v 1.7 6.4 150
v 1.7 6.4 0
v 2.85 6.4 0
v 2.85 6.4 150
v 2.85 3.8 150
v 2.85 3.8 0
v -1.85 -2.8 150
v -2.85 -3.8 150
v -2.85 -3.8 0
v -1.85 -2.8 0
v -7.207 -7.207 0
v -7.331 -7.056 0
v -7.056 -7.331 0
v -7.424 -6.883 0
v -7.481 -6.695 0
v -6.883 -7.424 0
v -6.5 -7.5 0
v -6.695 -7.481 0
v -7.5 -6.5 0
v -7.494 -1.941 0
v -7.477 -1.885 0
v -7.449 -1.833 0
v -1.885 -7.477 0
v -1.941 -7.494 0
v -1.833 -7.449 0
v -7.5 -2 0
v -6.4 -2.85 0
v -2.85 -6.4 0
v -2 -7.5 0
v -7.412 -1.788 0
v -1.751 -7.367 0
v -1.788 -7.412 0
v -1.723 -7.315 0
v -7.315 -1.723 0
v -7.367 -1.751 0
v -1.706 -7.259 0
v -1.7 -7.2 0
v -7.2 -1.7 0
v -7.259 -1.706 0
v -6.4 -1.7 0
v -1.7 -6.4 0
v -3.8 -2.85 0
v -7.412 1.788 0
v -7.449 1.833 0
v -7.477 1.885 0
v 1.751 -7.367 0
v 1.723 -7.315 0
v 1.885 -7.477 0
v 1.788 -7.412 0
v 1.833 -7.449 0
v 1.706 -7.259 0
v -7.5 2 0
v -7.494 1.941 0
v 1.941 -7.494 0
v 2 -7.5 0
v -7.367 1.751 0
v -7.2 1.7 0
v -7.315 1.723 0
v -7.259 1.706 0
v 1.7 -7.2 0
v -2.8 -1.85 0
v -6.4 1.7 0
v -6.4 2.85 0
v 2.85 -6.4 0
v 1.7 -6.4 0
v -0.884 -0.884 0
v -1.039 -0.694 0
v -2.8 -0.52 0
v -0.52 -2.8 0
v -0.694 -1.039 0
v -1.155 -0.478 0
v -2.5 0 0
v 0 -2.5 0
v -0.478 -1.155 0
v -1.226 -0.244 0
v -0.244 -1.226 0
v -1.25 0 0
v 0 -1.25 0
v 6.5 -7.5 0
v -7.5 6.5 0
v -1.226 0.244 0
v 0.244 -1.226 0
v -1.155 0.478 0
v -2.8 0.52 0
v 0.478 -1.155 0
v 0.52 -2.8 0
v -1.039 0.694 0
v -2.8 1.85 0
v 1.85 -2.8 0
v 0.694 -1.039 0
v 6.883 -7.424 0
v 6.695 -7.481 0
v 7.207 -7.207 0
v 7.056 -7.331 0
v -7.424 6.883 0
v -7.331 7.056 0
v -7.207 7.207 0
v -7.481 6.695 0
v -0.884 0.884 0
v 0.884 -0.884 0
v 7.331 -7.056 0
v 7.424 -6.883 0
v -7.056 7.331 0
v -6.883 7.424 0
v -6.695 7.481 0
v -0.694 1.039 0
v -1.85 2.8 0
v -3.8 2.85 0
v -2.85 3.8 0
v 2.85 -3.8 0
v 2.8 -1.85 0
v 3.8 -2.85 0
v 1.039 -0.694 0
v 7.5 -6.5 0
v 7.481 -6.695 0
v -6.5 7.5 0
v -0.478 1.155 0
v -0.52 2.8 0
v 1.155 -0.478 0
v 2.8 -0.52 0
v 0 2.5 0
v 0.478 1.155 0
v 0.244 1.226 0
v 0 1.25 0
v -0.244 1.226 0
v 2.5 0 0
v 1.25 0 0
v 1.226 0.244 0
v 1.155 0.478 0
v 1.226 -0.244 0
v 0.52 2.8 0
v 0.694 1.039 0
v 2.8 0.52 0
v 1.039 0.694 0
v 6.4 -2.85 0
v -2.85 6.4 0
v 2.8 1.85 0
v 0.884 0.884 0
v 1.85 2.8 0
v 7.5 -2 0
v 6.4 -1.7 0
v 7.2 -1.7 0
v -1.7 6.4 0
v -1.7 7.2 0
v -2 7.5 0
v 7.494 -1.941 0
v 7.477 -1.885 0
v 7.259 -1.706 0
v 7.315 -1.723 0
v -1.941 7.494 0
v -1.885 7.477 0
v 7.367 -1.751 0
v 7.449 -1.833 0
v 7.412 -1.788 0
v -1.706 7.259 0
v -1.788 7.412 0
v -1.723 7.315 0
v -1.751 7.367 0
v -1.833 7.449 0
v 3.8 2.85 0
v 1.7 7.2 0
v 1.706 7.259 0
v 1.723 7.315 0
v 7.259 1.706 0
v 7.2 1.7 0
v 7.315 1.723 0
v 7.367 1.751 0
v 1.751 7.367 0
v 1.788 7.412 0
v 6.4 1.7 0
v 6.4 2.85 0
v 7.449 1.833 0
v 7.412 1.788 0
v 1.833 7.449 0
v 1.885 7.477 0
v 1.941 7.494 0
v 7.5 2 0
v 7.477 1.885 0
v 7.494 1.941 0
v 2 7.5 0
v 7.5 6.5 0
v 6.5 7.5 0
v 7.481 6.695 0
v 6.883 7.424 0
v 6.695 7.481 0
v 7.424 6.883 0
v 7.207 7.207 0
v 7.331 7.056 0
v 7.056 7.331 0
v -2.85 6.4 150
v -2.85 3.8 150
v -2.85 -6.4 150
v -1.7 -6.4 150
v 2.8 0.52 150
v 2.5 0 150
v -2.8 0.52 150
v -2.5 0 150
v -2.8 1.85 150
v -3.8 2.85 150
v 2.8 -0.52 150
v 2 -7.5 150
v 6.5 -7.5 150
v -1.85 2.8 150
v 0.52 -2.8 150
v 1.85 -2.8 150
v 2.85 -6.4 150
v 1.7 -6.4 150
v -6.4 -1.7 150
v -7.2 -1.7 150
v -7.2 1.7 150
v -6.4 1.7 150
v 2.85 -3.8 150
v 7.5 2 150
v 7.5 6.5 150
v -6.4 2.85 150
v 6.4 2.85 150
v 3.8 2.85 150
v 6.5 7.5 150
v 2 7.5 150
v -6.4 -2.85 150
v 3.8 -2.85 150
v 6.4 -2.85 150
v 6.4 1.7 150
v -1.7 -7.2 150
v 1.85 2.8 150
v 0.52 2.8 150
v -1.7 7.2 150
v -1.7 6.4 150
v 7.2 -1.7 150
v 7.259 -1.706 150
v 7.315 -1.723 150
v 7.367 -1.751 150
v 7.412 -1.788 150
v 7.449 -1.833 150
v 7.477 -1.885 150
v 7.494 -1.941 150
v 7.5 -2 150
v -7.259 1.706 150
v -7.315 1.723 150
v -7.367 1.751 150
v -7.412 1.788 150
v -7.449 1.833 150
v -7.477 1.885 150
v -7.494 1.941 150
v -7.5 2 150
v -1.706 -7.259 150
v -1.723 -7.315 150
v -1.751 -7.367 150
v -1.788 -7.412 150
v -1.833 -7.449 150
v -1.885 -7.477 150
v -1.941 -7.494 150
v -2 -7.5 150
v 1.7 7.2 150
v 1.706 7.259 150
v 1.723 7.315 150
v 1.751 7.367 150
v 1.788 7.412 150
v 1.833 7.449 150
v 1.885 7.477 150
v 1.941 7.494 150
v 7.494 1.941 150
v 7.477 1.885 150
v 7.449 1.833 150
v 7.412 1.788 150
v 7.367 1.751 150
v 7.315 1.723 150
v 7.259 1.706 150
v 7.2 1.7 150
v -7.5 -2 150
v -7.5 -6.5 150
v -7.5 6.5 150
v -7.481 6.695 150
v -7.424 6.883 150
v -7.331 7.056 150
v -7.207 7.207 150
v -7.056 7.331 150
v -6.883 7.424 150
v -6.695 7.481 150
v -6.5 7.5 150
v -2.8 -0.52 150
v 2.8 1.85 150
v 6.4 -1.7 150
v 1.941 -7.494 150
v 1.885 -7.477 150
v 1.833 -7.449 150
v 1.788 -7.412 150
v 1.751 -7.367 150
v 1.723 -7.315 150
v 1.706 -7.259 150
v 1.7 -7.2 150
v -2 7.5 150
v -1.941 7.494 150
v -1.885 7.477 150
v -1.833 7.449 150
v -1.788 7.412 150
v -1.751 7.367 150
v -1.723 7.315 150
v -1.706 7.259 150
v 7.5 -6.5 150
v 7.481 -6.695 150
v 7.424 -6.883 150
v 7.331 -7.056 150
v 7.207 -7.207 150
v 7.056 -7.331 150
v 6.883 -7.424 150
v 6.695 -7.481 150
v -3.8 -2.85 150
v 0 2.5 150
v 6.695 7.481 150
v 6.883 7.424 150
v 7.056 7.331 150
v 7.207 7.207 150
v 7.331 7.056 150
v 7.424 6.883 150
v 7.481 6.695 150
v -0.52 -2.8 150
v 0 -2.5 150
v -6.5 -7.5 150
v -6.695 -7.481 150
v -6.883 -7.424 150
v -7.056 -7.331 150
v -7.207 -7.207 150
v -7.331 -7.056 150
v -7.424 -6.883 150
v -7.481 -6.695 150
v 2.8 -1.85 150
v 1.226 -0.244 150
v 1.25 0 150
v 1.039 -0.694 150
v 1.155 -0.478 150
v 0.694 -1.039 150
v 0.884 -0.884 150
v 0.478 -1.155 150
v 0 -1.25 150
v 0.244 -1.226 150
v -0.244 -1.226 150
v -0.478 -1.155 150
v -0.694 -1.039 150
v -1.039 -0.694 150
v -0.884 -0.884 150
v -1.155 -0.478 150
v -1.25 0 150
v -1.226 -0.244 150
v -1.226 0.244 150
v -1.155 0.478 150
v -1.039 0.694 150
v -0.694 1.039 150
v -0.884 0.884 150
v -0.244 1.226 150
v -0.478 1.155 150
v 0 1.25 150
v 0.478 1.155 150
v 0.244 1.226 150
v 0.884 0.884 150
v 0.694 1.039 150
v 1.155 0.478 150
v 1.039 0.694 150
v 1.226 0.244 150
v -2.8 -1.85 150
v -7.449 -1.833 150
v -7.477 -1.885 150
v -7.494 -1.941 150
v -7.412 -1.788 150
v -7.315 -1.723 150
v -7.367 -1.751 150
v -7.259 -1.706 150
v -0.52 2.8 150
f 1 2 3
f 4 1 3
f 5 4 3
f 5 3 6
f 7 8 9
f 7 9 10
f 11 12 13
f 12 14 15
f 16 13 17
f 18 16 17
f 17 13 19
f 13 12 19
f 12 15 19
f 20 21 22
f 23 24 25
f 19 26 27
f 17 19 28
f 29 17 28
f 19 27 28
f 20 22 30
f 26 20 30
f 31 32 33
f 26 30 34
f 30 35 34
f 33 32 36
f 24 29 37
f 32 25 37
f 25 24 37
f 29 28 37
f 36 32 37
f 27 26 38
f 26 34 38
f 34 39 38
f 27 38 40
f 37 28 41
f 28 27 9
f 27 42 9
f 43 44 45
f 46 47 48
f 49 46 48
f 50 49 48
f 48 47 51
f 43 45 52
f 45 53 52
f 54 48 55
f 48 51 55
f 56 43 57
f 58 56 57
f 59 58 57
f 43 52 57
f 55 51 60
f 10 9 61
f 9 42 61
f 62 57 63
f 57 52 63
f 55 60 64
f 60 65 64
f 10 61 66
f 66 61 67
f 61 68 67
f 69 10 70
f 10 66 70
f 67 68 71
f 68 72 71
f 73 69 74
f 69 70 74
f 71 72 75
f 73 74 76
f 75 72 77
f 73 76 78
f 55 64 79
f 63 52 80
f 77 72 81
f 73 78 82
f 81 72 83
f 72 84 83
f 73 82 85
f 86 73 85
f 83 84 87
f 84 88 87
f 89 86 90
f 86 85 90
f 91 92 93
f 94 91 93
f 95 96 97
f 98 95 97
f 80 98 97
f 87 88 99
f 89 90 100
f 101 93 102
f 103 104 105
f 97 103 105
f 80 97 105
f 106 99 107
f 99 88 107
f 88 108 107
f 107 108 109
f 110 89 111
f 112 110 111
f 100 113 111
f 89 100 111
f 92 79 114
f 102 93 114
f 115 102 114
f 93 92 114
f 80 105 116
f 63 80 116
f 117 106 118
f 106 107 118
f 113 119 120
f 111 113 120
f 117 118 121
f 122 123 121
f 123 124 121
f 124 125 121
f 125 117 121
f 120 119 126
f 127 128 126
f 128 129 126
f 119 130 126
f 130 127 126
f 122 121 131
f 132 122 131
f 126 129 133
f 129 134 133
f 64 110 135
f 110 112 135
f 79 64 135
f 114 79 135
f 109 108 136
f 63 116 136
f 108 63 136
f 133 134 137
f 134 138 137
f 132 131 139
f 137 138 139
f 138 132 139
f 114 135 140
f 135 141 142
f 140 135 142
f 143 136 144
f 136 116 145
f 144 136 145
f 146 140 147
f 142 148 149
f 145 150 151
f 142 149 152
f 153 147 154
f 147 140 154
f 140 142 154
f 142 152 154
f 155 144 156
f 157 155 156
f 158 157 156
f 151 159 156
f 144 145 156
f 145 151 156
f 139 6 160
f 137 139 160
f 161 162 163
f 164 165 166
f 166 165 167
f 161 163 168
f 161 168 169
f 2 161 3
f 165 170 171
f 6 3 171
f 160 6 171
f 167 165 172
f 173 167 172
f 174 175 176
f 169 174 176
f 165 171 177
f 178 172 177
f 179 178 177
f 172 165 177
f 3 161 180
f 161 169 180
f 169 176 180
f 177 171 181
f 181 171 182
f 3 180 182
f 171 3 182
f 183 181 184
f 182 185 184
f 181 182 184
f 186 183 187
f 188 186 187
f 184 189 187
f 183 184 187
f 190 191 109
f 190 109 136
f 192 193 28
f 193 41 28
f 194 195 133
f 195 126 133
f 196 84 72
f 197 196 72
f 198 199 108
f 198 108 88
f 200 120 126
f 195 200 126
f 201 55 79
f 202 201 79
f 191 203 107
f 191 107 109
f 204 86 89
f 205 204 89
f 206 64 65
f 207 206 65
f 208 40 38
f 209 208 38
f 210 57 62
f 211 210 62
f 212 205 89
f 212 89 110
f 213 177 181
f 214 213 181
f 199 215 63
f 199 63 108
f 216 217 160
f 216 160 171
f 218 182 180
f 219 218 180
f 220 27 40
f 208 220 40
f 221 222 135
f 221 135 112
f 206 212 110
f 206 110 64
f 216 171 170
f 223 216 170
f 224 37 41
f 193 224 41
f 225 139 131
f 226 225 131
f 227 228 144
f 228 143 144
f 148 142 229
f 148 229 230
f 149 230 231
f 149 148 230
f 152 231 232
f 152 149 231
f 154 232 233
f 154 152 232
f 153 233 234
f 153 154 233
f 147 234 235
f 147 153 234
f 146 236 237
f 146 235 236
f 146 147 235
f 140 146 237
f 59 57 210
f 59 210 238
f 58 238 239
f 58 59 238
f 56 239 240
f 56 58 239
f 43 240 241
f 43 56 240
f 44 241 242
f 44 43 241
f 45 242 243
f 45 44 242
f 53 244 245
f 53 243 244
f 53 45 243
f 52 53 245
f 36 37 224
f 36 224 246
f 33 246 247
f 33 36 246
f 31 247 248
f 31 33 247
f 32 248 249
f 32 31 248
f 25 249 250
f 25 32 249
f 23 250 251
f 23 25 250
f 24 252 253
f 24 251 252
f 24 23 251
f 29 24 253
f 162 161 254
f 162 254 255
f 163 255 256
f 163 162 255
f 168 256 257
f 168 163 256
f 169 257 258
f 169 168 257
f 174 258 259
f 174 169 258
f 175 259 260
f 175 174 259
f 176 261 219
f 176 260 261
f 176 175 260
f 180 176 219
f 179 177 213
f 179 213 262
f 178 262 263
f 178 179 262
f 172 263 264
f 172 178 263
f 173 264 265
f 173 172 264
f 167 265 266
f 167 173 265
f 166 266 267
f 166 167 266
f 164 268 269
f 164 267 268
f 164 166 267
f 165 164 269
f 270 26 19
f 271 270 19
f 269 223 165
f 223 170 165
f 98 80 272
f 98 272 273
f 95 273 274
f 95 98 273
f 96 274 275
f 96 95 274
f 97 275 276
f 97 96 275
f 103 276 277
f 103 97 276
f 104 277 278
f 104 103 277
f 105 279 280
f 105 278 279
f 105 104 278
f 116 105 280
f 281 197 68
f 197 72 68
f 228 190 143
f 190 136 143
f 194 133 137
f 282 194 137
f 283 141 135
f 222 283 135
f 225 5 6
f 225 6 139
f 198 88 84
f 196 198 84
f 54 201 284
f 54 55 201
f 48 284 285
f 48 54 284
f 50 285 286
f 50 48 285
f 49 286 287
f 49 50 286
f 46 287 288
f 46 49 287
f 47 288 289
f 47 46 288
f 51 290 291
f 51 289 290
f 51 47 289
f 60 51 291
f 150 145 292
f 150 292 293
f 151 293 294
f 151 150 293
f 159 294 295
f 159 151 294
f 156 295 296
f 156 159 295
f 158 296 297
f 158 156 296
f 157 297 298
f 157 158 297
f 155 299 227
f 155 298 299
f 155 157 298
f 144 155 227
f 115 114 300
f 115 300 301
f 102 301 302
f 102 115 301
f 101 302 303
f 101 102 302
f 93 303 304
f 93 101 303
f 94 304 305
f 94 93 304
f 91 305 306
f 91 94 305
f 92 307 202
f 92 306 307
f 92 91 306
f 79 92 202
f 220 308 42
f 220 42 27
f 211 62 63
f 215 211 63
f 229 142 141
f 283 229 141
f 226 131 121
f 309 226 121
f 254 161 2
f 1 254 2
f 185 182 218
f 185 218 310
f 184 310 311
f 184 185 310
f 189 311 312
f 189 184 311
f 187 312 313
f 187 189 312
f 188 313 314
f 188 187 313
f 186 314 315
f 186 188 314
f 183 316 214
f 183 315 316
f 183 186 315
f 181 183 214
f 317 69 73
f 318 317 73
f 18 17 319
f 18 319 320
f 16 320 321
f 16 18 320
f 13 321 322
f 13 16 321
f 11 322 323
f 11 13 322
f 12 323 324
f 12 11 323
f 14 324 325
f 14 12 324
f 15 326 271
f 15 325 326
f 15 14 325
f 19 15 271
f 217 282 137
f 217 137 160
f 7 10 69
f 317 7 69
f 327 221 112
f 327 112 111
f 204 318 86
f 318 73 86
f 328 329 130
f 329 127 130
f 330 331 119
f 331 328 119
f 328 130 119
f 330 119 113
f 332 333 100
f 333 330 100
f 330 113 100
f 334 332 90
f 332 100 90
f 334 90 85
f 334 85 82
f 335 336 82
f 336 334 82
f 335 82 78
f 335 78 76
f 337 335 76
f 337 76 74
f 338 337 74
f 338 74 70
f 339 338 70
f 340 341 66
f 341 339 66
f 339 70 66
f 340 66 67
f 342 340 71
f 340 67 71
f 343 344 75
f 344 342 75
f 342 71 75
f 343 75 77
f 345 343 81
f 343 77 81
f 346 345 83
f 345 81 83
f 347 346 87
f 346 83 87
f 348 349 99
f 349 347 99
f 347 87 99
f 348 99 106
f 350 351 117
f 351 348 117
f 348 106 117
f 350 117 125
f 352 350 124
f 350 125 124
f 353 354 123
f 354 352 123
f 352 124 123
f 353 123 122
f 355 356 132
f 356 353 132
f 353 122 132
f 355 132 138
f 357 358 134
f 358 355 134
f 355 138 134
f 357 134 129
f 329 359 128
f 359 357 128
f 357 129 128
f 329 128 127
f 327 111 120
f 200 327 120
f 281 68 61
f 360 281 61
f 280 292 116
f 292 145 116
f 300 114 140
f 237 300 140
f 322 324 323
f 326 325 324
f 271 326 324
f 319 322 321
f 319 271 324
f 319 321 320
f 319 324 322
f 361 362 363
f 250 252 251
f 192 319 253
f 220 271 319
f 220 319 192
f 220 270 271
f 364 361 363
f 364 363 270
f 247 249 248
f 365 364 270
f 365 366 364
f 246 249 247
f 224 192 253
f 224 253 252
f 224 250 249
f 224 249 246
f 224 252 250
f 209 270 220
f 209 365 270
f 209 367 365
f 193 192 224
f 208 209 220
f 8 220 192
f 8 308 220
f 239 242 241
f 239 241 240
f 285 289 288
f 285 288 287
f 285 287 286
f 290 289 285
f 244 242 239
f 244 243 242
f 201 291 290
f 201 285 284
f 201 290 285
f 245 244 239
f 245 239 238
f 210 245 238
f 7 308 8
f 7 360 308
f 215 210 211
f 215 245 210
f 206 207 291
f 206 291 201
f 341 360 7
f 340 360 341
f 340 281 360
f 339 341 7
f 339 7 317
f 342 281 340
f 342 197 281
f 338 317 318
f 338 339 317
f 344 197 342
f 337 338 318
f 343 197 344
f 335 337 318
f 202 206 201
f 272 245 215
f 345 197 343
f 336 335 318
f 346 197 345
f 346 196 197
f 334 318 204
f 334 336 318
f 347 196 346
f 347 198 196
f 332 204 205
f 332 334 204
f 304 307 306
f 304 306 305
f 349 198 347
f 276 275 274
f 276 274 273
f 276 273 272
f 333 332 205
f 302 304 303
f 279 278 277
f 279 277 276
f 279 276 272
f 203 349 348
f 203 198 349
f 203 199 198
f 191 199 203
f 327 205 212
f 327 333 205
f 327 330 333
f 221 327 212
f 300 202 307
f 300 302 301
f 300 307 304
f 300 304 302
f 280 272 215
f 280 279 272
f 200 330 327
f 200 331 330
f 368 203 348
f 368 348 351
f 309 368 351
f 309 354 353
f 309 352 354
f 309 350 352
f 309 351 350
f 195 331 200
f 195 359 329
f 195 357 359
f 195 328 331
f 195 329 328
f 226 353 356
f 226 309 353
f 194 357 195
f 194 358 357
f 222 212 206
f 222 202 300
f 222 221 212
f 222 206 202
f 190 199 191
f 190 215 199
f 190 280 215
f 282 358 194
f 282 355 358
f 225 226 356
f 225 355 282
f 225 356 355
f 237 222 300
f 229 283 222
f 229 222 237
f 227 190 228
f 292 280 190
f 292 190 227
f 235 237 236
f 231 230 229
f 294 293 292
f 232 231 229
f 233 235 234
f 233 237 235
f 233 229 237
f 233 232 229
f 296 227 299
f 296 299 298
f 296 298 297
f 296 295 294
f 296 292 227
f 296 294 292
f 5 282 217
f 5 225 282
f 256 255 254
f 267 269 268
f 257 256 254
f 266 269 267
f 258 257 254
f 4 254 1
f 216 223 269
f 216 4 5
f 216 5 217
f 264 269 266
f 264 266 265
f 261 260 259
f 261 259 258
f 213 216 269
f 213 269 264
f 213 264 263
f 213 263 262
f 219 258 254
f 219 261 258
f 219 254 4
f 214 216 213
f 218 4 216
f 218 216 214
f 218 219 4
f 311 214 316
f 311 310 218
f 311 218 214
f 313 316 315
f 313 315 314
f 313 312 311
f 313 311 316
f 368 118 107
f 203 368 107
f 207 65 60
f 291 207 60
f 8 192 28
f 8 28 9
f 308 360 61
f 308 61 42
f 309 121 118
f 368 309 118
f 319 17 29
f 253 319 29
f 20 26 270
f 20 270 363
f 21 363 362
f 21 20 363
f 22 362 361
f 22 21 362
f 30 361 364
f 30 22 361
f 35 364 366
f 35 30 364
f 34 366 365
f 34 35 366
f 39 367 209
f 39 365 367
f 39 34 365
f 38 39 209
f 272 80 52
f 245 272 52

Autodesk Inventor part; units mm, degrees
ref_plane "YZ Plane" through (0, 0, 0) normal (1, 0, 0) x (0, 1, 0)
ref_plane "XZ Plane" through (0, 0, 0) normal (0, 1, 0) x (-1, 0, 0)
ref_plane "XY Plane" through (0, 0, 0) normal (0, 0, 1) x (1, 0, 0)
sketch "Sketch_1" plane through (0, 0, 0) normal (0, 0, 1) x (1, 0, 0)
  arc A0 (-7.5, 2) -> (-7.2, 1.7) centre (-7.2, 2) ccw
  line L0 (-7.2, 1.7) -> (-6.4, 1.7)
  line L1 (-6.4, 1.7) -> (-6.4, 2.85)
  line L2 (-6.4, 2.85) -> (-3.8, 2.85)
  line L3 (-3.8, 2.85) -> (-2.8, 1.85)
  line L4 (-2.8, 1.85) -> (-2.8, 0.5196)
  line L5 (-2.8, 0.5196) -> (-2.5, 0)
  line L6 (-2.5, 0) -> (-2.8, -0.5196)
  line L7 (-2.8, -0.5196) -> (-2.8, -1.85)
  line L8 (-2.8, -1.85) -> (-3.8, -2.85)
  line L9 (-3.8, -2.85) -> (-6.4, -2.85)
  line L10 (-6.4, -2.85) -> (-6.4, -1.7)
  line L11 (-6.4, -1.7) -> (-7.2, -1.7)
  arc A1 (-7.2, -1.7) -> (-7.5, -2) centre (-7.2, -2) ccw
  line L12 (-7.5, -2) -> (-7.5, -6.5)
  arc A2 (-7.5, -6.5) -> (-6.5, -7.5) centre (-6.5, -6.5) ccw
  line L13 (-6.5, -7.5) -> (-2, -7.5)
  arc A3 (-2, -7.5) -> (-1.7, -7.2) centre (-2, -7.2) ccw
  line L14 (-1.7, -7.2) -> (-1.7, -6.4)
  line L15 (-1.7, -6.4) -> (-2.85, -6.4)
  line L16 (-2.85, -6.4) -> (-2.85, -3.8)
  line L17 (-2.85, -3.8) -> (-1.85, -2.8)
  line L18 (-1.85, -2.8) -> (-0.5196, -2.8)
  line L19 (-0.5196, -2.8) -> (0, -2.5)
  line L20 (0, -2.5) -> (0.5196, -2.8)
  line L21 (0.5196, -2.8) -> (1.85, -2.8)
  line L22 (1.85, -2.8) -> (2.85, -3.8)
  line L23 (2.85, -3.8) -> (2.85, -6.4)
  line L24 (2.85, -6.4) -> (1.7, -6.4)
  line L25 (1.7, -6.4) -> (1.7, -7.2)
  arc A4 (1.7, -7.2) -> (2, -7.5) centre (2, -7.2) ccw
  line L26 (2, -7.5) -> (6.5, -7.5)
  arc A5 (6.5, -7.5) -> (7.5, -6.5) centre (6.5, -6.5) ccw
  line L27 (7.5, -6.5) -> (7.5, -2)
  arc A6 (7.5, -2) -> (7.2, -1.7) centre (7.2, -2) ccw
  line L28 (7.2, -1.7) -> (6.4, -1.7)
  line L29 (6.4, -1.7) -> (6.4, -2.85)
  line L30 (6.4, -2.85) -> (3.8, -2.85)
  line L31 (3.8, -2.85) -> (2.8, -1.85)
  line L32 (2.8, -1.85) -> (2.8, -0.5196)
  line L33 (2.8, -0.5196) -> (2.5, 0)
  line L34 (2.5, 0) -> (2.8, 0.5196)
  line L35 (2.8, 0.5196) -> (2.8, 1.85)
  line L36 (2.8, 1.85) -> (3.8, 2.85)
  line L37 (3.8, 2.85) -> (6.4, 2.85)
  line L38 (6.4, 2.85) -> (6.4, 1.7)
  line L39 (6.4, 1.7) -> (7.2, 1.7)
  arc A7 (7.2, 1.7) -> (7.5, 2) centre (7.2, 2) ccw
  line L40 (7.5, 2) -> (7.5, 6.5)
  arc A8 (7.5, 6.5) -> (6.5, 7.5) centre (6.5, 6.5) ccw
  line L41 (6.5, 7.5) -> (2, 7.5)
  arc A9 (2, 7.5) -> (1.7, 7.2) centre (2, 7.2) ccw
  line L42 (1.7, 7.2) -> (1.7, 6.4)
  line L43 (1.7, 6.4) -> (2.85, 6.4)
  line L44 (2.85, 6.4) -> (2.85, 3.8)
  line L45 (2.85, 3.8) -> (1.85, 2.8)
  line L46 (1.85, 2.8) -> (0.5196, 2.8)
  line L47 (0.5196, 2.8) -> (0, 2.5)
  line L48 (0, 2.5) -> (-0.5196, 2.8)
  line L49 (-0.5196, 2.8) -> (-1.85, 2.8)
  line L50 (-1.85, 2.8) -> (-2.85, 3.8)
  line L51 (-2.85, 3.8) -> (-2.85, 6.4)
  line L52 (-2.85, 6.4) -> (-1.7, 6.4)
  line L53 (-1.7, 6.4) -> (-1.7, 7.2)
  arc A10 (-1.7, 7.2) -> (-2, 7.5) centre (-2, 7.2) ccw
  line L54 (-2, 7.5) -> (-6.5, 7.5)
  arc A11 (-6.5, 7.5) -> (-7.5, 6.5) centre (-6.5, 6.5) ccw
  line L55 (-7.5, 6.5) -> (-7.5, 2)
  circle A12 centre (0, 0) radius 1.25
extrude "Extrusion1" add sketch "Sketch_1" along normal blind 150
equation "\"d0\" = L"
equation "\"L\" = 150"
properties part number "HFS3-1515-150" material "アルミニウム 6061"
